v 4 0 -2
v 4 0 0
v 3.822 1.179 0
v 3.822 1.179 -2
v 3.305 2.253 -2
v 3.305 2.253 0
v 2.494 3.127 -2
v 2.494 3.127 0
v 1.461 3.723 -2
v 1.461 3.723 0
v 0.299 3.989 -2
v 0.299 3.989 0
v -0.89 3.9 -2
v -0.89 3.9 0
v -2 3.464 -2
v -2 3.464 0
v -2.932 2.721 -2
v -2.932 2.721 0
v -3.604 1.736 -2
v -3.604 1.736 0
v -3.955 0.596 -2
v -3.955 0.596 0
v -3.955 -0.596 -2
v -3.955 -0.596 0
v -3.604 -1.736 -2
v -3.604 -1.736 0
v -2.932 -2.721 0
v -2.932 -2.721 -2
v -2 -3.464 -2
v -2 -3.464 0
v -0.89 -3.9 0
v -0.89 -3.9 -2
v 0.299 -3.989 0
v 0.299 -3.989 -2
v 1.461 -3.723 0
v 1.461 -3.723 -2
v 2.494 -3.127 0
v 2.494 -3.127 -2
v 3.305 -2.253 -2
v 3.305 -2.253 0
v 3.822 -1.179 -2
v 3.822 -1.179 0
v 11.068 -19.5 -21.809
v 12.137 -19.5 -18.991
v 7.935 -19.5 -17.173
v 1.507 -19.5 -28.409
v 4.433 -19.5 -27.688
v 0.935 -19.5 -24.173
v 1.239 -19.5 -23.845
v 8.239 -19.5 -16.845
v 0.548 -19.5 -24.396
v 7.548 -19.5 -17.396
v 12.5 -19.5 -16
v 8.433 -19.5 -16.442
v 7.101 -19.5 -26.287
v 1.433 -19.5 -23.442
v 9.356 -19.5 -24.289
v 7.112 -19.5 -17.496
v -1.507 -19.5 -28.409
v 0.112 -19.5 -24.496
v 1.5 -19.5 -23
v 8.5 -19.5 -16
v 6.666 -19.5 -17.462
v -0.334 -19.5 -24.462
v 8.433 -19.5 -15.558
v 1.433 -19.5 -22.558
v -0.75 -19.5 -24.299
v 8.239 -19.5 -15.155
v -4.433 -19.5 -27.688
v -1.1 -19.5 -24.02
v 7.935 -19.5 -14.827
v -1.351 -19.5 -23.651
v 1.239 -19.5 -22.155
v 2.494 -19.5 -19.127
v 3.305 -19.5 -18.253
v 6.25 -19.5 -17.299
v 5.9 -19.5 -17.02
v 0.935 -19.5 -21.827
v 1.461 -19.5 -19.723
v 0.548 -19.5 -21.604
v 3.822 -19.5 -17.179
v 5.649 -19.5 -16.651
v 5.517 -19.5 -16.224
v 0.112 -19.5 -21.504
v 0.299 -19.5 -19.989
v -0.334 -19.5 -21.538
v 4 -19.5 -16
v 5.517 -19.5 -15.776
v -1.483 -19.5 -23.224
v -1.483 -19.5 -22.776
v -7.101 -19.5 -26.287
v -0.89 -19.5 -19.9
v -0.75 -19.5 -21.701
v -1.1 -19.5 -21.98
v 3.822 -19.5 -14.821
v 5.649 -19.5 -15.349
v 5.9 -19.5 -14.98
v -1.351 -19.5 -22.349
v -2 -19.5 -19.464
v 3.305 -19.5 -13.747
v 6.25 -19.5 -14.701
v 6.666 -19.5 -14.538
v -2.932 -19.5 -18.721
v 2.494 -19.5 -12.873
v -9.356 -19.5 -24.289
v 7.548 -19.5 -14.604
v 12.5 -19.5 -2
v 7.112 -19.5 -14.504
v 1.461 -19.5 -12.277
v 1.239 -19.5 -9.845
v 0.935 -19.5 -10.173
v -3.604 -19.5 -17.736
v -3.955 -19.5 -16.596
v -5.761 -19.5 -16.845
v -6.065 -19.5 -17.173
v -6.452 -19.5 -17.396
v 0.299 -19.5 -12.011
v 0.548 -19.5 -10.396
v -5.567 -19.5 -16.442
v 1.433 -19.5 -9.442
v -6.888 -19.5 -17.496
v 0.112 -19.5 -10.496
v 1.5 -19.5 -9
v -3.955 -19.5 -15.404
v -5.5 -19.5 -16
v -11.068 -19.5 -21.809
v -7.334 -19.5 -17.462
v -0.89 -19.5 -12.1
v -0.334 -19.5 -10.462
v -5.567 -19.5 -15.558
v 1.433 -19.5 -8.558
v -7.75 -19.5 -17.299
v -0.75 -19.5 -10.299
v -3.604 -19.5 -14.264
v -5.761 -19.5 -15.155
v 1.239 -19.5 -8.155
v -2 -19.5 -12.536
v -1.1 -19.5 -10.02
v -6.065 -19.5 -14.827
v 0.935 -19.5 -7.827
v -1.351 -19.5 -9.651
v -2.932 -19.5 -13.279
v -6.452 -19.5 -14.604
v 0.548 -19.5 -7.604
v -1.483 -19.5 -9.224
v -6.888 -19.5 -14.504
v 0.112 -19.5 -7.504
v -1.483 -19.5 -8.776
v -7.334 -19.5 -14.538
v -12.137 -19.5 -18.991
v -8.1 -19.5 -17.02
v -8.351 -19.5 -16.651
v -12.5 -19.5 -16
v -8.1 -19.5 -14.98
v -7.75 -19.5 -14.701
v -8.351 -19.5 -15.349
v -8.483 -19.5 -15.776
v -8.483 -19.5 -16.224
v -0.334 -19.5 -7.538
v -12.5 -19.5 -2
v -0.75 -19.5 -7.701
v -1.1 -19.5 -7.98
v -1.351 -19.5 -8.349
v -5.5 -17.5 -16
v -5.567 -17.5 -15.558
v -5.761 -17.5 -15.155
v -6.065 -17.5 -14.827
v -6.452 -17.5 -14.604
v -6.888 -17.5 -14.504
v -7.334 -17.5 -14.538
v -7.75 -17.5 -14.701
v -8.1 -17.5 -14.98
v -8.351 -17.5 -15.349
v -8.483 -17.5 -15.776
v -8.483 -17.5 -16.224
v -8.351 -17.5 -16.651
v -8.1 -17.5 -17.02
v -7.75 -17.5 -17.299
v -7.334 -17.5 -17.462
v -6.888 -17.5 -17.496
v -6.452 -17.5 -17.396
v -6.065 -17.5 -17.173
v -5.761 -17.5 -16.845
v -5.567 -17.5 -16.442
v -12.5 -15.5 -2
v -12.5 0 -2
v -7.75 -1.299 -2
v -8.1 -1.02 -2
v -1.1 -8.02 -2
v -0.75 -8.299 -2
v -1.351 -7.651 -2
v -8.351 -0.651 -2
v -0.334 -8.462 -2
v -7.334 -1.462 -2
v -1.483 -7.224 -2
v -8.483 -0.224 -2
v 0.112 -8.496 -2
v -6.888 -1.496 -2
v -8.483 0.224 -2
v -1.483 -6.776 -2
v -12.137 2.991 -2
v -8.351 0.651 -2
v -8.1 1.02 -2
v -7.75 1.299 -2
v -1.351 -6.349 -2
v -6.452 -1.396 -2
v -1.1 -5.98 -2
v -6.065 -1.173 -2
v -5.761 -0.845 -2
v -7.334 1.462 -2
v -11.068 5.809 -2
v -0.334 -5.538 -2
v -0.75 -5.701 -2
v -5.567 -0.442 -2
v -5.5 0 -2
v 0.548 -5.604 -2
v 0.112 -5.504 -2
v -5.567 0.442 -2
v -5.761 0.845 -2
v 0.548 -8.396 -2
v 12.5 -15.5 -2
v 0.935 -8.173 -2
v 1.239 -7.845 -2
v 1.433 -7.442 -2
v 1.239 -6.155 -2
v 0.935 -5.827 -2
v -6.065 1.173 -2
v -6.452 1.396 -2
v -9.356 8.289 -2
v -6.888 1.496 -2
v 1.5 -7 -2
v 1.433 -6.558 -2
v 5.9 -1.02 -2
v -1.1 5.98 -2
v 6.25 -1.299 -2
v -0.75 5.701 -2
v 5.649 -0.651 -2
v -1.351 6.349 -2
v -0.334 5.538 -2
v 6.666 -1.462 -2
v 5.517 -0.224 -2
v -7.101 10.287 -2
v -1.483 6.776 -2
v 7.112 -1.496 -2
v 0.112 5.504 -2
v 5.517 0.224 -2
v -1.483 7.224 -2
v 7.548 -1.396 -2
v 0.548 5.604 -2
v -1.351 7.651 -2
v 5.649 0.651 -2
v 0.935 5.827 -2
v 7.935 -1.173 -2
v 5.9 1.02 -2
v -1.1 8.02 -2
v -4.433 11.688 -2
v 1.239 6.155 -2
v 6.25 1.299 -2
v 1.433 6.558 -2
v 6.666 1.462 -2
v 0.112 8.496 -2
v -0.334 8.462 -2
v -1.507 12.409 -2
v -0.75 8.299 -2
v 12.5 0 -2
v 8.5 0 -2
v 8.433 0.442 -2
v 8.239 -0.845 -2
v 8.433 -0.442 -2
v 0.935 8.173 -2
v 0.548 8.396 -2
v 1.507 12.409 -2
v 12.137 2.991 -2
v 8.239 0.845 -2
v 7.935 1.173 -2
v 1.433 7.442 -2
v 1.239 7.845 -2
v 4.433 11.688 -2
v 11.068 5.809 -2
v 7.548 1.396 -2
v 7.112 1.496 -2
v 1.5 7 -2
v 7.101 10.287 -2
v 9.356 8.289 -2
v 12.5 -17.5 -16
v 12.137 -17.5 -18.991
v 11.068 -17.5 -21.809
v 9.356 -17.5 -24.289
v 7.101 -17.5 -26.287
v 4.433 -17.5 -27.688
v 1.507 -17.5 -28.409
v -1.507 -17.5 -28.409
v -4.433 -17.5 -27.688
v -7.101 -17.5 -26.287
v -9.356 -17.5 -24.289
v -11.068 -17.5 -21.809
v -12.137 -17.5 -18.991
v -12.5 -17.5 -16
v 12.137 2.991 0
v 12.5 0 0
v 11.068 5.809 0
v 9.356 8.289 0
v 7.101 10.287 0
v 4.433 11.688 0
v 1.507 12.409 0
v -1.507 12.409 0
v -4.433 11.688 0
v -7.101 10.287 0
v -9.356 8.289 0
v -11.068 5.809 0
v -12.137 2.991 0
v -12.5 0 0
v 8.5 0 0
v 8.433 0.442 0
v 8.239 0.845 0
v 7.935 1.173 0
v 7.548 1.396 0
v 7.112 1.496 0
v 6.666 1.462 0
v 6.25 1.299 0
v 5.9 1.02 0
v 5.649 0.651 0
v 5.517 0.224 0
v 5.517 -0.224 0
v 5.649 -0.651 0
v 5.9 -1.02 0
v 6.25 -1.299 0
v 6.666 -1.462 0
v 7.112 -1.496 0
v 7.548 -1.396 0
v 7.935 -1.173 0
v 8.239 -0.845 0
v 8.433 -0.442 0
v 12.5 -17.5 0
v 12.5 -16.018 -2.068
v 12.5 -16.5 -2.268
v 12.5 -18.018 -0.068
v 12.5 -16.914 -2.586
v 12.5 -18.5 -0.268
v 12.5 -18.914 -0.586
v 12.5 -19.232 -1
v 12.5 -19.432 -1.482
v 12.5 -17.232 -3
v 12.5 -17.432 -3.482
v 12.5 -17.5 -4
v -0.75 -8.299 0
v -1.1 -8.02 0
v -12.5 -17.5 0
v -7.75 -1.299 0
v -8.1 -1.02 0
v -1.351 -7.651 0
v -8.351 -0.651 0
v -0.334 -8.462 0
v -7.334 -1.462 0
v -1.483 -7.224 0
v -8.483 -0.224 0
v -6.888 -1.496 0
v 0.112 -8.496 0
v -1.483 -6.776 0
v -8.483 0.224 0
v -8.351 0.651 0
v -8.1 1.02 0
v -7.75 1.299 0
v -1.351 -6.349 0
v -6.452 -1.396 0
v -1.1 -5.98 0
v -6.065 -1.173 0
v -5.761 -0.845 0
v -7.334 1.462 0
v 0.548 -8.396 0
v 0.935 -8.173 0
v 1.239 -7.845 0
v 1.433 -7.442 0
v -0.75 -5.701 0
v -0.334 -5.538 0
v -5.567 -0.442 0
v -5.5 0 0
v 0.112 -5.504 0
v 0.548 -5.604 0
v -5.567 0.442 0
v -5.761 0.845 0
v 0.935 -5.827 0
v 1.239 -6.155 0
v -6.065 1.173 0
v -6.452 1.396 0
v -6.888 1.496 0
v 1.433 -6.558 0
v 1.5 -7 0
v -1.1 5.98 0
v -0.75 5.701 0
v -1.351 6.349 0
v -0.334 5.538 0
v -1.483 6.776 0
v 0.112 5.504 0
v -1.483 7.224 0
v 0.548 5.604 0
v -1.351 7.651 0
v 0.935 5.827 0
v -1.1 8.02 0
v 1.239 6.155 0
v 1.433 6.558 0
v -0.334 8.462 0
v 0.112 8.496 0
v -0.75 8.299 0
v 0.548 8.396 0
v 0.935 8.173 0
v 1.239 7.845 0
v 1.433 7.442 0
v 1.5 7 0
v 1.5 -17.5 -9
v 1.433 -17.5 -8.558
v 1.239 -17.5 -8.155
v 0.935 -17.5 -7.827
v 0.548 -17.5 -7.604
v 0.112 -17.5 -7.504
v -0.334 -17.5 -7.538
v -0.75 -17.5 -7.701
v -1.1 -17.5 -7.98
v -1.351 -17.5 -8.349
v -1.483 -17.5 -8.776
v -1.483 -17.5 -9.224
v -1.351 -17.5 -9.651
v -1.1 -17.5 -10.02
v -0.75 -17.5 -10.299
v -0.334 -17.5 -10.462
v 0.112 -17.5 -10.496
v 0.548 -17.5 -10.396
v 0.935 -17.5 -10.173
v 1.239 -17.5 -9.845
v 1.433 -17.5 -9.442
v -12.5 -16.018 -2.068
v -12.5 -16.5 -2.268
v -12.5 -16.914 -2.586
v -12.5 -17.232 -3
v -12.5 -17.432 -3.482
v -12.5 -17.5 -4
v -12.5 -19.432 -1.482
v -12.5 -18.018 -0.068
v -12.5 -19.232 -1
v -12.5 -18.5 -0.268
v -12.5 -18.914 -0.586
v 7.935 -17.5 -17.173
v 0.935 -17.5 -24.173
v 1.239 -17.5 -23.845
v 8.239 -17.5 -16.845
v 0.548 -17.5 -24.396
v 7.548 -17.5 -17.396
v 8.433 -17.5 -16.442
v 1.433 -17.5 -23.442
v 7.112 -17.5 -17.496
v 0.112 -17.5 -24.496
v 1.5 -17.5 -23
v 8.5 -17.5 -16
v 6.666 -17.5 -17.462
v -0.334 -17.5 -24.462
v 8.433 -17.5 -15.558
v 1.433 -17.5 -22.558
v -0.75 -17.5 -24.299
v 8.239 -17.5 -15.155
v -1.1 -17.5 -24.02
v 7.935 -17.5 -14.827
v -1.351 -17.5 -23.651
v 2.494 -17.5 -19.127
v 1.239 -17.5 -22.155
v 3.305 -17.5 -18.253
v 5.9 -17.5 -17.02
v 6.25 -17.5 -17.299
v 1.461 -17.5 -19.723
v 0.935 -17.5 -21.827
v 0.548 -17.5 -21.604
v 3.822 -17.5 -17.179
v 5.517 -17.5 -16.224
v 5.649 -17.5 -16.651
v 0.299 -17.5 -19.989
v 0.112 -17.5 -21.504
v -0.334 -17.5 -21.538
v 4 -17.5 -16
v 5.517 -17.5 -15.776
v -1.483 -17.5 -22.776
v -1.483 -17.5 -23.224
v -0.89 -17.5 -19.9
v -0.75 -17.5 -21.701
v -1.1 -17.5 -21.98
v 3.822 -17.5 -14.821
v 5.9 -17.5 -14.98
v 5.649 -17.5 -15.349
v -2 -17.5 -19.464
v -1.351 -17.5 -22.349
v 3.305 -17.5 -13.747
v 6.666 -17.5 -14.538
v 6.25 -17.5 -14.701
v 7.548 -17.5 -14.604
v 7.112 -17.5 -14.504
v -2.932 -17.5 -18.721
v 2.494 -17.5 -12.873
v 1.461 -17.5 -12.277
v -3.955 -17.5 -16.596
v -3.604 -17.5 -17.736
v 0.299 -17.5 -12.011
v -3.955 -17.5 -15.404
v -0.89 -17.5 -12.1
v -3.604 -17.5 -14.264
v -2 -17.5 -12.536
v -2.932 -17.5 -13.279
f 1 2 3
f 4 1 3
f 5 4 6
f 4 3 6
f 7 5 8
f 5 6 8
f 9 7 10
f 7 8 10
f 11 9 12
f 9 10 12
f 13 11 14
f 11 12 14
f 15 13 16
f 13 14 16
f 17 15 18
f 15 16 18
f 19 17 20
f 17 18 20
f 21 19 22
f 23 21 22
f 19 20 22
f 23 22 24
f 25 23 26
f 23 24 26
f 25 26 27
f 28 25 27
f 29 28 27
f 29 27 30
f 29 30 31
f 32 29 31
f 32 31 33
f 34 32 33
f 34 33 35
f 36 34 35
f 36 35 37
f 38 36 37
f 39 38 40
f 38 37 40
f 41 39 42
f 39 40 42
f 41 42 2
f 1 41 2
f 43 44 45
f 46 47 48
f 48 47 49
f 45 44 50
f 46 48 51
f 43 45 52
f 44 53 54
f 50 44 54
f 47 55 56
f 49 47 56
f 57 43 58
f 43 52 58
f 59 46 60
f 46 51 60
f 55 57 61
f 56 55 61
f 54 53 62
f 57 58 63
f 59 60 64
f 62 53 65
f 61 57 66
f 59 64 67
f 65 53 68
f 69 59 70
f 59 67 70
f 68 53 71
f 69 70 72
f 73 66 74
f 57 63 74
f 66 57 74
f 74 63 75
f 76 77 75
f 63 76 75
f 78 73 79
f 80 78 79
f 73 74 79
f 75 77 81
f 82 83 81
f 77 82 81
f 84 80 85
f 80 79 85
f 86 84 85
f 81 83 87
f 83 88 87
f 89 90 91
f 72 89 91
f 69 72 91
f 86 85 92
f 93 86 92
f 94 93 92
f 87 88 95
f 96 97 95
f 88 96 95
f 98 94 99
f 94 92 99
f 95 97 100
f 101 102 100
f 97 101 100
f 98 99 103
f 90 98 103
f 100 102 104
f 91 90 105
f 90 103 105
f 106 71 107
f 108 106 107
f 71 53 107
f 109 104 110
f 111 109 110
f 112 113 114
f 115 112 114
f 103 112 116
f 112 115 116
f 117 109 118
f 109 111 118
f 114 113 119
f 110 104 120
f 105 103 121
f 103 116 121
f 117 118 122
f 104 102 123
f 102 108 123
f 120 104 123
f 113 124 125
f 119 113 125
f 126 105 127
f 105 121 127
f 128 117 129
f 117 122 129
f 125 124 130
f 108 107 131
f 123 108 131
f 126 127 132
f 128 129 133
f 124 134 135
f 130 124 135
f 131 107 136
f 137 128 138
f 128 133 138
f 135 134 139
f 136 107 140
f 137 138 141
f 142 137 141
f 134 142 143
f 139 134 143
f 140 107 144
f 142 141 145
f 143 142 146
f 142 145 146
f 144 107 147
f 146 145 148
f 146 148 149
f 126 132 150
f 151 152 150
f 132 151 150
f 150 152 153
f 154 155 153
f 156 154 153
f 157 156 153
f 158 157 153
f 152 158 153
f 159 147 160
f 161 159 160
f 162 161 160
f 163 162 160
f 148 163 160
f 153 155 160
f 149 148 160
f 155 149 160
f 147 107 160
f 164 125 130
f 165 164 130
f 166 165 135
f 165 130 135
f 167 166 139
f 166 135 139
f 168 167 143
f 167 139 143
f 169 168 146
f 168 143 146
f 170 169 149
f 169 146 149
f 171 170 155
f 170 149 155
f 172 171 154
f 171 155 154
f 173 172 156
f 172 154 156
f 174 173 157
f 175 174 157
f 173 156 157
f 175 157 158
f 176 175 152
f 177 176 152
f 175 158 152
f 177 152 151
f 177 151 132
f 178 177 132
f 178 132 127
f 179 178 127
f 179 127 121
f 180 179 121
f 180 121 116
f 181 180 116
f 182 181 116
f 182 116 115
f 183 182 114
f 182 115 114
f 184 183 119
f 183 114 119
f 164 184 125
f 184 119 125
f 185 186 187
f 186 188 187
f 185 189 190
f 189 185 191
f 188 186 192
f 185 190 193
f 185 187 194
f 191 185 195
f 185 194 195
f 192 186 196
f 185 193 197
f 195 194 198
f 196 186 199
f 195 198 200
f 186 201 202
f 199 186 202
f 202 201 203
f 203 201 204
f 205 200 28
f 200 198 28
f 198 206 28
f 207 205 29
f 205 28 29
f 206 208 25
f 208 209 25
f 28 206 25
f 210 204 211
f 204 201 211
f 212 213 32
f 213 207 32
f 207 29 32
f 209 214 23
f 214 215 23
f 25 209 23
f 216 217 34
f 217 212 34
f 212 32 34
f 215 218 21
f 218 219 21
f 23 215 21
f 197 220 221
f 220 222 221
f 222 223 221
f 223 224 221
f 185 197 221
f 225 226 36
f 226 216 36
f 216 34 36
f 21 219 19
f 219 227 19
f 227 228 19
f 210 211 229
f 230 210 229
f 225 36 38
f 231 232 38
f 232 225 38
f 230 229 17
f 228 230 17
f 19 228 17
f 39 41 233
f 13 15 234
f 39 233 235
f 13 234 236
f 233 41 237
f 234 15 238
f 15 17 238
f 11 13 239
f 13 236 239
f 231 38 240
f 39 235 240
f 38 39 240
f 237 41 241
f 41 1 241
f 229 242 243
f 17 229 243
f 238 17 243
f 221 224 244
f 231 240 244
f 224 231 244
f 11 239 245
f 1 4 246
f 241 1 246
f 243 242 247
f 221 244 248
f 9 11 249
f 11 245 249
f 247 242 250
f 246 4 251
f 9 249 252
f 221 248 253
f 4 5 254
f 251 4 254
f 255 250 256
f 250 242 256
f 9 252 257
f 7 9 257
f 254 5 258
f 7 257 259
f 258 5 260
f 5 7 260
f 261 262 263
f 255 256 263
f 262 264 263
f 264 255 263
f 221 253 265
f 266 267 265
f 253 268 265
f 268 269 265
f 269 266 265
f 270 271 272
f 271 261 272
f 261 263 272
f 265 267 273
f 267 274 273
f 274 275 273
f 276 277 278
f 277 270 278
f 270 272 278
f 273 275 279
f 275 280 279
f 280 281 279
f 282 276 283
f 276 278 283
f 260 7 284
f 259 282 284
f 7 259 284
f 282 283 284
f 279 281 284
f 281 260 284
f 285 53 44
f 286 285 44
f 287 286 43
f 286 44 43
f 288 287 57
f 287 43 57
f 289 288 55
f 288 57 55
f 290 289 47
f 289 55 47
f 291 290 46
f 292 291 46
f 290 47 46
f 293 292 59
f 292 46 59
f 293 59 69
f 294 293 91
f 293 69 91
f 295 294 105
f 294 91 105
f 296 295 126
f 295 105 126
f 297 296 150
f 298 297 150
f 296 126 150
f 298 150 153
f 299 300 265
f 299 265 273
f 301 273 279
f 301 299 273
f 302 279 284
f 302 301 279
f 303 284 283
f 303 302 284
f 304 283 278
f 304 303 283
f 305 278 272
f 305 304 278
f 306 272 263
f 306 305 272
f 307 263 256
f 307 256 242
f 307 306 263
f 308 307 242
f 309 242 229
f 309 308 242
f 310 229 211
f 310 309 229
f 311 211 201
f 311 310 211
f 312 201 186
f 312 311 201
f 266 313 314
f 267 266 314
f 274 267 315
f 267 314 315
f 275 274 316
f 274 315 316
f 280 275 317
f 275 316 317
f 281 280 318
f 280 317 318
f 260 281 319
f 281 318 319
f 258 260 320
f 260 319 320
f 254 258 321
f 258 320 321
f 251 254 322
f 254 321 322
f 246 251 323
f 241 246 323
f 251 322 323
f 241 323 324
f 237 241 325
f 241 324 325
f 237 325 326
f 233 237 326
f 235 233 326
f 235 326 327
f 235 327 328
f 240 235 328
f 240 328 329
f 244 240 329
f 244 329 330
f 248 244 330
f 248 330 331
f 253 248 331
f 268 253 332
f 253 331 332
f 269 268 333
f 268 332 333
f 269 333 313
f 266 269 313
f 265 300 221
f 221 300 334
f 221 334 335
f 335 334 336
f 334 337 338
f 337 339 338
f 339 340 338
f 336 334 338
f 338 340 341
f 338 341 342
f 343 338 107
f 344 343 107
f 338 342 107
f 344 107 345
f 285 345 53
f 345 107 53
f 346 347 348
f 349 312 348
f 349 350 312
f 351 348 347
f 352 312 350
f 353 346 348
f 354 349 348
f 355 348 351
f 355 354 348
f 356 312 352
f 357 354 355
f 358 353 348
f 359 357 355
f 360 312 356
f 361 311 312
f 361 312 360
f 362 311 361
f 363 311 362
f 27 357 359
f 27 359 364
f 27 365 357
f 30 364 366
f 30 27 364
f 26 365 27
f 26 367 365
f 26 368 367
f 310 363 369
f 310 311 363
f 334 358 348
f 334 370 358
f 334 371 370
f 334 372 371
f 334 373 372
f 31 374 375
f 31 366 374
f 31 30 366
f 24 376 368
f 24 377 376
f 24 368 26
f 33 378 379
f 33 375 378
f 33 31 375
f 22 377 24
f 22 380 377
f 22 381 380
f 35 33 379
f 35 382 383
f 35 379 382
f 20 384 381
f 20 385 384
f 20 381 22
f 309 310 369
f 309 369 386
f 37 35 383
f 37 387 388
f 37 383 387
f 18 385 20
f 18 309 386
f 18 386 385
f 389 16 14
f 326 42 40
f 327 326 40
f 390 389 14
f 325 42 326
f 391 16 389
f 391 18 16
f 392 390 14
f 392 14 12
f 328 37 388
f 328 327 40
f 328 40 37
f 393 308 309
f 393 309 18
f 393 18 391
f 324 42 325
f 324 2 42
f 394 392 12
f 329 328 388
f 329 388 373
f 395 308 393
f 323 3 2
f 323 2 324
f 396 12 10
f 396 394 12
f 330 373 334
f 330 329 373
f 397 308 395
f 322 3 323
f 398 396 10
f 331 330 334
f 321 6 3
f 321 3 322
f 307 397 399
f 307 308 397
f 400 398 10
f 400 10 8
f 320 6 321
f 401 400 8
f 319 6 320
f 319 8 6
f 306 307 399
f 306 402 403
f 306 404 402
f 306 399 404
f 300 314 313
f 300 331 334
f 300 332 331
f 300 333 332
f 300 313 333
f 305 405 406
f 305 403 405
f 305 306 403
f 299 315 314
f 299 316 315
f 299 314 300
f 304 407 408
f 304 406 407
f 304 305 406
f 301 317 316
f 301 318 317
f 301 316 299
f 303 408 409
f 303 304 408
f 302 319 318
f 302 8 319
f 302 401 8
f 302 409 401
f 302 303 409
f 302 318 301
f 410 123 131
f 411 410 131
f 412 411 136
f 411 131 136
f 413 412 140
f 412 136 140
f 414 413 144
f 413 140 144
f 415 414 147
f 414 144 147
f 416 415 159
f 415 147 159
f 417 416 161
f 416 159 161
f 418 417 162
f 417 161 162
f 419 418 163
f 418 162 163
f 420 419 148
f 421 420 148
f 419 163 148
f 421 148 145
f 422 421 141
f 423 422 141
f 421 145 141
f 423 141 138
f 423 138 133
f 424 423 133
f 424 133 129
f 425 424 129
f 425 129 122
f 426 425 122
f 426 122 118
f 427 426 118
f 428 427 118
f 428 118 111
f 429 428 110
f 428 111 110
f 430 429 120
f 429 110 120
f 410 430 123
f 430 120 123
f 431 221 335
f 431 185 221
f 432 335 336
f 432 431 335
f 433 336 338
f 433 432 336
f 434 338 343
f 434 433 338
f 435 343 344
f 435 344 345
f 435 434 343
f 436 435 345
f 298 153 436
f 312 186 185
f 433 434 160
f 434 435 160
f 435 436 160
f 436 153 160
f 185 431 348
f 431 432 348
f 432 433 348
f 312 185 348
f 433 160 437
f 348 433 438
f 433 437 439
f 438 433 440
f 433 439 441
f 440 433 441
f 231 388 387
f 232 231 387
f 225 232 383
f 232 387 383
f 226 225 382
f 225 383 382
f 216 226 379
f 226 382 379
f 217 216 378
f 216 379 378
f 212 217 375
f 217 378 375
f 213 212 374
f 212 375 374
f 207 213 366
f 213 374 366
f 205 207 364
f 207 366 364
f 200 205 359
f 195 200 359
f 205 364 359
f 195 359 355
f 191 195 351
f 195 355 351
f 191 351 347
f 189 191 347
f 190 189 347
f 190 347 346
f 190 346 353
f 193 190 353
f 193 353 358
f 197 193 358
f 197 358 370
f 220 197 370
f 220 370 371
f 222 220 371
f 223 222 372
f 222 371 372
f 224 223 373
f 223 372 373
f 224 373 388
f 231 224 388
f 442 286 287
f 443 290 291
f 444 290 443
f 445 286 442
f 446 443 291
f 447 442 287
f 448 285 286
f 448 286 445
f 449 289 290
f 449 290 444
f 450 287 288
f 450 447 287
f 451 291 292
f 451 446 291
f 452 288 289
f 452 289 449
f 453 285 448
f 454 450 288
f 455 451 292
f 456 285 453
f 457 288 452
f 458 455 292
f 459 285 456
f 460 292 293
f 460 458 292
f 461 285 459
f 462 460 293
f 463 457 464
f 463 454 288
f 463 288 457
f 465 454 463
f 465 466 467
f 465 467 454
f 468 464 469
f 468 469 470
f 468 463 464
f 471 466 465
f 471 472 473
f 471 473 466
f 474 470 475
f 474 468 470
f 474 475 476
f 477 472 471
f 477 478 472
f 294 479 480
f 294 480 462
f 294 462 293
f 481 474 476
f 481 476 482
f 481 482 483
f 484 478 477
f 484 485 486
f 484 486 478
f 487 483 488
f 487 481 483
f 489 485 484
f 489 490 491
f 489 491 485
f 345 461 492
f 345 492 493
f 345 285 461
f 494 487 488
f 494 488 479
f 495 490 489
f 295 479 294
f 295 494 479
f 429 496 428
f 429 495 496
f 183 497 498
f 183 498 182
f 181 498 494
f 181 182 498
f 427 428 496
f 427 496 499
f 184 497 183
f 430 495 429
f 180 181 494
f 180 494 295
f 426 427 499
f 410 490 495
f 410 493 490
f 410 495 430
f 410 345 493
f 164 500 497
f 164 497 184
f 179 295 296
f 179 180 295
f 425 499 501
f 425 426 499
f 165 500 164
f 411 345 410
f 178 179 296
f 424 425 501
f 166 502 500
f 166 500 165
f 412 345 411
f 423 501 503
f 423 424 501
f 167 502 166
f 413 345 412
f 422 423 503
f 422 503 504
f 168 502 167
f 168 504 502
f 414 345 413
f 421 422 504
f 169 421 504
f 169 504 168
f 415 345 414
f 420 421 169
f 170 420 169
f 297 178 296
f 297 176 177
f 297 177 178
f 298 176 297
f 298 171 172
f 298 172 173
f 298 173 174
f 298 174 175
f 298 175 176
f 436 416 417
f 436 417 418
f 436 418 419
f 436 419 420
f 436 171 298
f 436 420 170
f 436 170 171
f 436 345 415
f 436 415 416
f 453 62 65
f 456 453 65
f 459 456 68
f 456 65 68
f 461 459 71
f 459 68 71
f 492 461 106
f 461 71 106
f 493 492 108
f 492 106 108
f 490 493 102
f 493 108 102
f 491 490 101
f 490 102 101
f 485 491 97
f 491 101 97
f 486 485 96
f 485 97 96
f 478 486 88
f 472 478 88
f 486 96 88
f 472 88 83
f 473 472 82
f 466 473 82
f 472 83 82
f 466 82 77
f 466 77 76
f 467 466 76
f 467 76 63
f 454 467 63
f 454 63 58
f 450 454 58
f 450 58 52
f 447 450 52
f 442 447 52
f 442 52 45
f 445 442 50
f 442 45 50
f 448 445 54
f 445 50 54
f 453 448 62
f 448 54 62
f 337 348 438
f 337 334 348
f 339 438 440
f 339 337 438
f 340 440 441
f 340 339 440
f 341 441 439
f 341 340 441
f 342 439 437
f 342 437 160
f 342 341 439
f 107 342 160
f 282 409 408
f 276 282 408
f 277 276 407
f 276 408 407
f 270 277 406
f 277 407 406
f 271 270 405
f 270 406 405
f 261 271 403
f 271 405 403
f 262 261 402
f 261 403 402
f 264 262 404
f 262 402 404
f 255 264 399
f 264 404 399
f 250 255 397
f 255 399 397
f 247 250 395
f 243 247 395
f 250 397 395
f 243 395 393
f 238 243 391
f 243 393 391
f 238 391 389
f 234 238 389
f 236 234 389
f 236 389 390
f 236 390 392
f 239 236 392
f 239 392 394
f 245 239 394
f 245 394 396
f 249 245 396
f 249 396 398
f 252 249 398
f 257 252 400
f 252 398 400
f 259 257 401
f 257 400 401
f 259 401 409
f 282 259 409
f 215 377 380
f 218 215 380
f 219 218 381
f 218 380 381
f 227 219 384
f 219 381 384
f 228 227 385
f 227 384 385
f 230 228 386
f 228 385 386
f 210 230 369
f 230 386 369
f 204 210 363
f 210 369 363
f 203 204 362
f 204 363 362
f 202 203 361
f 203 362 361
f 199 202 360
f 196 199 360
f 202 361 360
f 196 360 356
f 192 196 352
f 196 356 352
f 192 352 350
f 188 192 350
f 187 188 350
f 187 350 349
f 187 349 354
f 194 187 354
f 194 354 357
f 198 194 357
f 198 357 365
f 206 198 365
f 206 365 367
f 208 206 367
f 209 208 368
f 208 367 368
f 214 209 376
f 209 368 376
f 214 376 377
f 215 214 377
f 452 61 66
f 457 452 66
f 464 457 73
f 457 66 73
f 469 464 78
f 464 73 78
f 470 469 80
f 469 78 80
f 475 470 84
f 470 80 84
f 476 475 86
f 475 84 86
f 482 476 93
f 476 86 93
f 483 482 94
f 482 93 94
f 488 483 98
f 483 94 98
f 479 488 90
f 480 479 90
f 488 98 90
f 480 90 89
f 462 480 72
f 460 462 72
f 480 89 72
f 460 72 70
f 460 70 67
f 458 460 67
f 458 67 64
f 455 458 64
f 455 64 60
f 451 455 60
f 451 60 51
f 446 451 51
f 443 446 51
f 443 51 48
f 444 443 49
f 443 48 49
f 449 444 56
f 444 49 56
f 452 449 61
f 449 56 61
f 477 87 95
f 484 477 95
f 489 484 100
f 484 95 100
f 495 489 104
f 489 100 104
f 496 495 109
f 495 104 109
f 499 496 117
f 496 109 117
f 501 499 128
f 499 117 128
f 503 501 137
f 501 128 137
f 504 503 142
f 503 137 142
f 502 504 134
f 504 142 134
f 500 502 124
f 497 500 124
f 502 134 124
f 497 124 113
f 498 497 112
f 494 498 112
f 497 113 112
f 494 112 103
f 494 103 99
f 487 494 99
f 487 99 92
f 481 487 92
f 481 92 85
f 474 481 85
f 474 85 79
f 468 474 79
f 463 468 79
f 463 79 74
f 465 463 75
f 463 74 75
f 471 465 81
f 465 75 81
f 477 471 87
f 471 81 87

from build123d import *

# Parameters (mm, degrees)
SKETCH1_R           = 4
SKETCH1_R_2         = 1.5
BOSS_EXTRUDE1_DEPTH = 2
SKETCH2_R           = 4
SKETCH2_R_2         = 1.5
BOSS_EXTRUDE2_DEPTH = 2
FILLET1_R           = 2


with BuildPart() as part:
    # Sketch1 → Boss-Extrude1 (new body)
    with BuildSketch(Plane.XY):
        with BuildLine():
            Line((-12.5, 0), (-12.5, -19.5))
            Line((-12.5, -19.5), (12.5, -19.5))
            Line((12.5, -19.5), (12.5, 0))
            ThreePointArc((12.5, 0), (0, 12.5), (-12.5, 0))
        make_face()
        Circle(SKETCH1_R, mode=Mode.SUBTRACT)
        with Locations((0, 7)):
            Circle(SKETCH1_R_2, mode=Mode.SUBTRACT)
        with Locations((7, 0)):
            Circle(SKETCH1_R_2, mode=Mode.SUBTRACT)
        with Locations((0, -7)):
            Circle(SKETCH1_R_2, mode=Mode.SUBTRACT)
        with Locations((-7, 0)):
            Circle(SKETCH1_R_2, mode=Mode.SUBTRACT)
    extrude(amount=-BOSS_EXTRUDE1_DEPTH)

    # Sketch2 → Boss-Extrude2 (add)
    with BuildSketch(Plane.XZ.offset(19.5)):
        with BuildLine():
            Line((-12.5, -16), (-12.5, 0))
            Line((-12.5, 0), (12.5, 0))
            Line((12.5, 0), (12.5, -16))
            ThreePointArc((12.5, -16), (0, -28.5), (-12.5, -16))
        make_face()
        with Locations((0, -16)):
            Circle(SKETCH2_R, mode=Mode.SUBTRACT)
        with Locations((0, -9)):
            Circle(SKETCH2_R_2, mode=Mode.SUBTRACT)
        with Locations((7, -16)):
            Circle(SKETCH2_R_2, mode=Mode.SUBTRACT)
        with Locations((0, -23)):
            Circle(SKETCH2_R_2, mode=Mode.SUBTRACT)
        with Locations((-7, -16)):
            Circle(SKETCH2_R_2, mode=Mode.SUBTRACT)
    extrude(amount=-BOSS_EXTRUDE2_DEPTH)

    # Fillet1
    fillet1_edges = [part.edges().sort_by_distance(p)[0] for p in [
        (0, -17.5, -2),
        (0, -19.5, 0),
    ]]
    fillet(fillet1_edges, radius=FILLET1_R)


solid = part.part
